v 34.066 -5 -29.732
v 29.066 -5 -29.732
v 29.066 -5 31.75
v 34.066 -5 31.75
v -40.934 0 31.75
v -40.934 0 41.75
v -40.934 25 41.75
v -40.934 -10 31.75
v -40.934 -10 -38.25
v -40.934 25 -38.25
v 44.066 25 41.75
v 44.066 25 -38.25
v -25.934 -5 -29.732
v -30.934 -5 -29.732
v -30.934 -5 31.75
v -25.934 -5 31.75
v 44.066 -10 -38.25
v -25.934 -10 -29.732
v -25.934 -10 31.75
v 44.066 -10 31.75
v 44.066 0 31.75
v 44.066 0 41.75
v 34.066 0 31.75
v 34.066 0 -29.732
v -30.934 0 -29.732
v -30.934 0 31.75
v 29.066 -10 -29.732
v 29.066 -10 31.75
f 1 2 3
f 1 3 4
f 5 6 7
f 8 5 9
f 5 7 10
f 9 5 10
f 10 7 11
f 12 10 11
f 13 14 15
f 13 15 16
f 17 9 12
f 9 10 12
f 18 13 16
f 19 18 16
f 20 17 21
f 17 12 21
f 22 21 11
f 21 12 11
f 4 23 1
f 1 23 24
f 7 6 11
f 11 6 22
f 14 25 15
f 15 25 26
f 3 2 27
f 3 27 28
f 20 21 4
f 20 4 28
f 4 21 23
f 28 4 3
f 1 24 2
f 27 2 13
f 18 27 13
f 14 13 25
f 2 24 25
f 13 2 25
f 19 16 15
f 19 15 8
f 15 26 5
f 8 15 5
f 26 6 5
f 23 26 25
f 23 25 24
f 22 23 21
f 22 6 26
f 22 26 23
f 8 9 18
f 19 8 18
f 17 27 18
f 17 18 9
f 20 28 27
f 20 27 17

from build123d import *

# Parameters (mm, degrees)
F0_W     = 85
F0_H     = 80
F2_DEPTH = 25
F3_DEPTH = 5
F4_W     = 5
F4_H     = 61.4819614498
F5_DEPTH = 5


with BuildPart() as f2:
    # F0 (on Front) → F2 (new body)
    with BuildSketch(Plane.XZ):
        with Locations((1.5661627076, 1.7497490255)):
            Rectangle(F0_W, F0_H)
    extrude(amount=-F2_DEPTH)

    # F1 (on Front) → F3 (join)
    with BuildSketch(Plane.XZ):
        Polygon((-30.9338372924, -29.7322124243), (-30.9338372924, 31.7497490255), (-40.9338372924, 31.7497490255), (-40.9338372924, -38.2502509745), (44.0661627076, -38.2502509745), (44.0661627076, 31.7497490255), (34.0661627076, 31.7497490255), (34.0661627076, -29.7322124243), align=None)
    extrude(amount=F3_DEPTH)

    # F4 (on face) → F5 (join)
    with BuildSketch(Plane.XZ.offset(5)):
        with Locations((-28.4338372924, 1.0087683006)):
            Rectangle(F4_W, F4_H)
        Polygon((-30.9338372924, 31.7497490255), (-40.9338372924, 31.7497490255), (-40.9338372924, -38.2502509745), (44.0661627076, -38.2502509745), (44.0661627076, 31.7497490255), (34.0661627076, 31.7497490255), (34.0661627076, -29.7322124243), (29.0661627076, -29.7322124243), (-25.9338372924, -29.7322124243), (-30.9338372924, -29.7322124243), align=None)
        with Locations((31.5661627076, 1.0087683006)):
            Rectangle(F4_W, F4_H)
    extrude(amount=F5_DEPTH)


solid = f2.part
